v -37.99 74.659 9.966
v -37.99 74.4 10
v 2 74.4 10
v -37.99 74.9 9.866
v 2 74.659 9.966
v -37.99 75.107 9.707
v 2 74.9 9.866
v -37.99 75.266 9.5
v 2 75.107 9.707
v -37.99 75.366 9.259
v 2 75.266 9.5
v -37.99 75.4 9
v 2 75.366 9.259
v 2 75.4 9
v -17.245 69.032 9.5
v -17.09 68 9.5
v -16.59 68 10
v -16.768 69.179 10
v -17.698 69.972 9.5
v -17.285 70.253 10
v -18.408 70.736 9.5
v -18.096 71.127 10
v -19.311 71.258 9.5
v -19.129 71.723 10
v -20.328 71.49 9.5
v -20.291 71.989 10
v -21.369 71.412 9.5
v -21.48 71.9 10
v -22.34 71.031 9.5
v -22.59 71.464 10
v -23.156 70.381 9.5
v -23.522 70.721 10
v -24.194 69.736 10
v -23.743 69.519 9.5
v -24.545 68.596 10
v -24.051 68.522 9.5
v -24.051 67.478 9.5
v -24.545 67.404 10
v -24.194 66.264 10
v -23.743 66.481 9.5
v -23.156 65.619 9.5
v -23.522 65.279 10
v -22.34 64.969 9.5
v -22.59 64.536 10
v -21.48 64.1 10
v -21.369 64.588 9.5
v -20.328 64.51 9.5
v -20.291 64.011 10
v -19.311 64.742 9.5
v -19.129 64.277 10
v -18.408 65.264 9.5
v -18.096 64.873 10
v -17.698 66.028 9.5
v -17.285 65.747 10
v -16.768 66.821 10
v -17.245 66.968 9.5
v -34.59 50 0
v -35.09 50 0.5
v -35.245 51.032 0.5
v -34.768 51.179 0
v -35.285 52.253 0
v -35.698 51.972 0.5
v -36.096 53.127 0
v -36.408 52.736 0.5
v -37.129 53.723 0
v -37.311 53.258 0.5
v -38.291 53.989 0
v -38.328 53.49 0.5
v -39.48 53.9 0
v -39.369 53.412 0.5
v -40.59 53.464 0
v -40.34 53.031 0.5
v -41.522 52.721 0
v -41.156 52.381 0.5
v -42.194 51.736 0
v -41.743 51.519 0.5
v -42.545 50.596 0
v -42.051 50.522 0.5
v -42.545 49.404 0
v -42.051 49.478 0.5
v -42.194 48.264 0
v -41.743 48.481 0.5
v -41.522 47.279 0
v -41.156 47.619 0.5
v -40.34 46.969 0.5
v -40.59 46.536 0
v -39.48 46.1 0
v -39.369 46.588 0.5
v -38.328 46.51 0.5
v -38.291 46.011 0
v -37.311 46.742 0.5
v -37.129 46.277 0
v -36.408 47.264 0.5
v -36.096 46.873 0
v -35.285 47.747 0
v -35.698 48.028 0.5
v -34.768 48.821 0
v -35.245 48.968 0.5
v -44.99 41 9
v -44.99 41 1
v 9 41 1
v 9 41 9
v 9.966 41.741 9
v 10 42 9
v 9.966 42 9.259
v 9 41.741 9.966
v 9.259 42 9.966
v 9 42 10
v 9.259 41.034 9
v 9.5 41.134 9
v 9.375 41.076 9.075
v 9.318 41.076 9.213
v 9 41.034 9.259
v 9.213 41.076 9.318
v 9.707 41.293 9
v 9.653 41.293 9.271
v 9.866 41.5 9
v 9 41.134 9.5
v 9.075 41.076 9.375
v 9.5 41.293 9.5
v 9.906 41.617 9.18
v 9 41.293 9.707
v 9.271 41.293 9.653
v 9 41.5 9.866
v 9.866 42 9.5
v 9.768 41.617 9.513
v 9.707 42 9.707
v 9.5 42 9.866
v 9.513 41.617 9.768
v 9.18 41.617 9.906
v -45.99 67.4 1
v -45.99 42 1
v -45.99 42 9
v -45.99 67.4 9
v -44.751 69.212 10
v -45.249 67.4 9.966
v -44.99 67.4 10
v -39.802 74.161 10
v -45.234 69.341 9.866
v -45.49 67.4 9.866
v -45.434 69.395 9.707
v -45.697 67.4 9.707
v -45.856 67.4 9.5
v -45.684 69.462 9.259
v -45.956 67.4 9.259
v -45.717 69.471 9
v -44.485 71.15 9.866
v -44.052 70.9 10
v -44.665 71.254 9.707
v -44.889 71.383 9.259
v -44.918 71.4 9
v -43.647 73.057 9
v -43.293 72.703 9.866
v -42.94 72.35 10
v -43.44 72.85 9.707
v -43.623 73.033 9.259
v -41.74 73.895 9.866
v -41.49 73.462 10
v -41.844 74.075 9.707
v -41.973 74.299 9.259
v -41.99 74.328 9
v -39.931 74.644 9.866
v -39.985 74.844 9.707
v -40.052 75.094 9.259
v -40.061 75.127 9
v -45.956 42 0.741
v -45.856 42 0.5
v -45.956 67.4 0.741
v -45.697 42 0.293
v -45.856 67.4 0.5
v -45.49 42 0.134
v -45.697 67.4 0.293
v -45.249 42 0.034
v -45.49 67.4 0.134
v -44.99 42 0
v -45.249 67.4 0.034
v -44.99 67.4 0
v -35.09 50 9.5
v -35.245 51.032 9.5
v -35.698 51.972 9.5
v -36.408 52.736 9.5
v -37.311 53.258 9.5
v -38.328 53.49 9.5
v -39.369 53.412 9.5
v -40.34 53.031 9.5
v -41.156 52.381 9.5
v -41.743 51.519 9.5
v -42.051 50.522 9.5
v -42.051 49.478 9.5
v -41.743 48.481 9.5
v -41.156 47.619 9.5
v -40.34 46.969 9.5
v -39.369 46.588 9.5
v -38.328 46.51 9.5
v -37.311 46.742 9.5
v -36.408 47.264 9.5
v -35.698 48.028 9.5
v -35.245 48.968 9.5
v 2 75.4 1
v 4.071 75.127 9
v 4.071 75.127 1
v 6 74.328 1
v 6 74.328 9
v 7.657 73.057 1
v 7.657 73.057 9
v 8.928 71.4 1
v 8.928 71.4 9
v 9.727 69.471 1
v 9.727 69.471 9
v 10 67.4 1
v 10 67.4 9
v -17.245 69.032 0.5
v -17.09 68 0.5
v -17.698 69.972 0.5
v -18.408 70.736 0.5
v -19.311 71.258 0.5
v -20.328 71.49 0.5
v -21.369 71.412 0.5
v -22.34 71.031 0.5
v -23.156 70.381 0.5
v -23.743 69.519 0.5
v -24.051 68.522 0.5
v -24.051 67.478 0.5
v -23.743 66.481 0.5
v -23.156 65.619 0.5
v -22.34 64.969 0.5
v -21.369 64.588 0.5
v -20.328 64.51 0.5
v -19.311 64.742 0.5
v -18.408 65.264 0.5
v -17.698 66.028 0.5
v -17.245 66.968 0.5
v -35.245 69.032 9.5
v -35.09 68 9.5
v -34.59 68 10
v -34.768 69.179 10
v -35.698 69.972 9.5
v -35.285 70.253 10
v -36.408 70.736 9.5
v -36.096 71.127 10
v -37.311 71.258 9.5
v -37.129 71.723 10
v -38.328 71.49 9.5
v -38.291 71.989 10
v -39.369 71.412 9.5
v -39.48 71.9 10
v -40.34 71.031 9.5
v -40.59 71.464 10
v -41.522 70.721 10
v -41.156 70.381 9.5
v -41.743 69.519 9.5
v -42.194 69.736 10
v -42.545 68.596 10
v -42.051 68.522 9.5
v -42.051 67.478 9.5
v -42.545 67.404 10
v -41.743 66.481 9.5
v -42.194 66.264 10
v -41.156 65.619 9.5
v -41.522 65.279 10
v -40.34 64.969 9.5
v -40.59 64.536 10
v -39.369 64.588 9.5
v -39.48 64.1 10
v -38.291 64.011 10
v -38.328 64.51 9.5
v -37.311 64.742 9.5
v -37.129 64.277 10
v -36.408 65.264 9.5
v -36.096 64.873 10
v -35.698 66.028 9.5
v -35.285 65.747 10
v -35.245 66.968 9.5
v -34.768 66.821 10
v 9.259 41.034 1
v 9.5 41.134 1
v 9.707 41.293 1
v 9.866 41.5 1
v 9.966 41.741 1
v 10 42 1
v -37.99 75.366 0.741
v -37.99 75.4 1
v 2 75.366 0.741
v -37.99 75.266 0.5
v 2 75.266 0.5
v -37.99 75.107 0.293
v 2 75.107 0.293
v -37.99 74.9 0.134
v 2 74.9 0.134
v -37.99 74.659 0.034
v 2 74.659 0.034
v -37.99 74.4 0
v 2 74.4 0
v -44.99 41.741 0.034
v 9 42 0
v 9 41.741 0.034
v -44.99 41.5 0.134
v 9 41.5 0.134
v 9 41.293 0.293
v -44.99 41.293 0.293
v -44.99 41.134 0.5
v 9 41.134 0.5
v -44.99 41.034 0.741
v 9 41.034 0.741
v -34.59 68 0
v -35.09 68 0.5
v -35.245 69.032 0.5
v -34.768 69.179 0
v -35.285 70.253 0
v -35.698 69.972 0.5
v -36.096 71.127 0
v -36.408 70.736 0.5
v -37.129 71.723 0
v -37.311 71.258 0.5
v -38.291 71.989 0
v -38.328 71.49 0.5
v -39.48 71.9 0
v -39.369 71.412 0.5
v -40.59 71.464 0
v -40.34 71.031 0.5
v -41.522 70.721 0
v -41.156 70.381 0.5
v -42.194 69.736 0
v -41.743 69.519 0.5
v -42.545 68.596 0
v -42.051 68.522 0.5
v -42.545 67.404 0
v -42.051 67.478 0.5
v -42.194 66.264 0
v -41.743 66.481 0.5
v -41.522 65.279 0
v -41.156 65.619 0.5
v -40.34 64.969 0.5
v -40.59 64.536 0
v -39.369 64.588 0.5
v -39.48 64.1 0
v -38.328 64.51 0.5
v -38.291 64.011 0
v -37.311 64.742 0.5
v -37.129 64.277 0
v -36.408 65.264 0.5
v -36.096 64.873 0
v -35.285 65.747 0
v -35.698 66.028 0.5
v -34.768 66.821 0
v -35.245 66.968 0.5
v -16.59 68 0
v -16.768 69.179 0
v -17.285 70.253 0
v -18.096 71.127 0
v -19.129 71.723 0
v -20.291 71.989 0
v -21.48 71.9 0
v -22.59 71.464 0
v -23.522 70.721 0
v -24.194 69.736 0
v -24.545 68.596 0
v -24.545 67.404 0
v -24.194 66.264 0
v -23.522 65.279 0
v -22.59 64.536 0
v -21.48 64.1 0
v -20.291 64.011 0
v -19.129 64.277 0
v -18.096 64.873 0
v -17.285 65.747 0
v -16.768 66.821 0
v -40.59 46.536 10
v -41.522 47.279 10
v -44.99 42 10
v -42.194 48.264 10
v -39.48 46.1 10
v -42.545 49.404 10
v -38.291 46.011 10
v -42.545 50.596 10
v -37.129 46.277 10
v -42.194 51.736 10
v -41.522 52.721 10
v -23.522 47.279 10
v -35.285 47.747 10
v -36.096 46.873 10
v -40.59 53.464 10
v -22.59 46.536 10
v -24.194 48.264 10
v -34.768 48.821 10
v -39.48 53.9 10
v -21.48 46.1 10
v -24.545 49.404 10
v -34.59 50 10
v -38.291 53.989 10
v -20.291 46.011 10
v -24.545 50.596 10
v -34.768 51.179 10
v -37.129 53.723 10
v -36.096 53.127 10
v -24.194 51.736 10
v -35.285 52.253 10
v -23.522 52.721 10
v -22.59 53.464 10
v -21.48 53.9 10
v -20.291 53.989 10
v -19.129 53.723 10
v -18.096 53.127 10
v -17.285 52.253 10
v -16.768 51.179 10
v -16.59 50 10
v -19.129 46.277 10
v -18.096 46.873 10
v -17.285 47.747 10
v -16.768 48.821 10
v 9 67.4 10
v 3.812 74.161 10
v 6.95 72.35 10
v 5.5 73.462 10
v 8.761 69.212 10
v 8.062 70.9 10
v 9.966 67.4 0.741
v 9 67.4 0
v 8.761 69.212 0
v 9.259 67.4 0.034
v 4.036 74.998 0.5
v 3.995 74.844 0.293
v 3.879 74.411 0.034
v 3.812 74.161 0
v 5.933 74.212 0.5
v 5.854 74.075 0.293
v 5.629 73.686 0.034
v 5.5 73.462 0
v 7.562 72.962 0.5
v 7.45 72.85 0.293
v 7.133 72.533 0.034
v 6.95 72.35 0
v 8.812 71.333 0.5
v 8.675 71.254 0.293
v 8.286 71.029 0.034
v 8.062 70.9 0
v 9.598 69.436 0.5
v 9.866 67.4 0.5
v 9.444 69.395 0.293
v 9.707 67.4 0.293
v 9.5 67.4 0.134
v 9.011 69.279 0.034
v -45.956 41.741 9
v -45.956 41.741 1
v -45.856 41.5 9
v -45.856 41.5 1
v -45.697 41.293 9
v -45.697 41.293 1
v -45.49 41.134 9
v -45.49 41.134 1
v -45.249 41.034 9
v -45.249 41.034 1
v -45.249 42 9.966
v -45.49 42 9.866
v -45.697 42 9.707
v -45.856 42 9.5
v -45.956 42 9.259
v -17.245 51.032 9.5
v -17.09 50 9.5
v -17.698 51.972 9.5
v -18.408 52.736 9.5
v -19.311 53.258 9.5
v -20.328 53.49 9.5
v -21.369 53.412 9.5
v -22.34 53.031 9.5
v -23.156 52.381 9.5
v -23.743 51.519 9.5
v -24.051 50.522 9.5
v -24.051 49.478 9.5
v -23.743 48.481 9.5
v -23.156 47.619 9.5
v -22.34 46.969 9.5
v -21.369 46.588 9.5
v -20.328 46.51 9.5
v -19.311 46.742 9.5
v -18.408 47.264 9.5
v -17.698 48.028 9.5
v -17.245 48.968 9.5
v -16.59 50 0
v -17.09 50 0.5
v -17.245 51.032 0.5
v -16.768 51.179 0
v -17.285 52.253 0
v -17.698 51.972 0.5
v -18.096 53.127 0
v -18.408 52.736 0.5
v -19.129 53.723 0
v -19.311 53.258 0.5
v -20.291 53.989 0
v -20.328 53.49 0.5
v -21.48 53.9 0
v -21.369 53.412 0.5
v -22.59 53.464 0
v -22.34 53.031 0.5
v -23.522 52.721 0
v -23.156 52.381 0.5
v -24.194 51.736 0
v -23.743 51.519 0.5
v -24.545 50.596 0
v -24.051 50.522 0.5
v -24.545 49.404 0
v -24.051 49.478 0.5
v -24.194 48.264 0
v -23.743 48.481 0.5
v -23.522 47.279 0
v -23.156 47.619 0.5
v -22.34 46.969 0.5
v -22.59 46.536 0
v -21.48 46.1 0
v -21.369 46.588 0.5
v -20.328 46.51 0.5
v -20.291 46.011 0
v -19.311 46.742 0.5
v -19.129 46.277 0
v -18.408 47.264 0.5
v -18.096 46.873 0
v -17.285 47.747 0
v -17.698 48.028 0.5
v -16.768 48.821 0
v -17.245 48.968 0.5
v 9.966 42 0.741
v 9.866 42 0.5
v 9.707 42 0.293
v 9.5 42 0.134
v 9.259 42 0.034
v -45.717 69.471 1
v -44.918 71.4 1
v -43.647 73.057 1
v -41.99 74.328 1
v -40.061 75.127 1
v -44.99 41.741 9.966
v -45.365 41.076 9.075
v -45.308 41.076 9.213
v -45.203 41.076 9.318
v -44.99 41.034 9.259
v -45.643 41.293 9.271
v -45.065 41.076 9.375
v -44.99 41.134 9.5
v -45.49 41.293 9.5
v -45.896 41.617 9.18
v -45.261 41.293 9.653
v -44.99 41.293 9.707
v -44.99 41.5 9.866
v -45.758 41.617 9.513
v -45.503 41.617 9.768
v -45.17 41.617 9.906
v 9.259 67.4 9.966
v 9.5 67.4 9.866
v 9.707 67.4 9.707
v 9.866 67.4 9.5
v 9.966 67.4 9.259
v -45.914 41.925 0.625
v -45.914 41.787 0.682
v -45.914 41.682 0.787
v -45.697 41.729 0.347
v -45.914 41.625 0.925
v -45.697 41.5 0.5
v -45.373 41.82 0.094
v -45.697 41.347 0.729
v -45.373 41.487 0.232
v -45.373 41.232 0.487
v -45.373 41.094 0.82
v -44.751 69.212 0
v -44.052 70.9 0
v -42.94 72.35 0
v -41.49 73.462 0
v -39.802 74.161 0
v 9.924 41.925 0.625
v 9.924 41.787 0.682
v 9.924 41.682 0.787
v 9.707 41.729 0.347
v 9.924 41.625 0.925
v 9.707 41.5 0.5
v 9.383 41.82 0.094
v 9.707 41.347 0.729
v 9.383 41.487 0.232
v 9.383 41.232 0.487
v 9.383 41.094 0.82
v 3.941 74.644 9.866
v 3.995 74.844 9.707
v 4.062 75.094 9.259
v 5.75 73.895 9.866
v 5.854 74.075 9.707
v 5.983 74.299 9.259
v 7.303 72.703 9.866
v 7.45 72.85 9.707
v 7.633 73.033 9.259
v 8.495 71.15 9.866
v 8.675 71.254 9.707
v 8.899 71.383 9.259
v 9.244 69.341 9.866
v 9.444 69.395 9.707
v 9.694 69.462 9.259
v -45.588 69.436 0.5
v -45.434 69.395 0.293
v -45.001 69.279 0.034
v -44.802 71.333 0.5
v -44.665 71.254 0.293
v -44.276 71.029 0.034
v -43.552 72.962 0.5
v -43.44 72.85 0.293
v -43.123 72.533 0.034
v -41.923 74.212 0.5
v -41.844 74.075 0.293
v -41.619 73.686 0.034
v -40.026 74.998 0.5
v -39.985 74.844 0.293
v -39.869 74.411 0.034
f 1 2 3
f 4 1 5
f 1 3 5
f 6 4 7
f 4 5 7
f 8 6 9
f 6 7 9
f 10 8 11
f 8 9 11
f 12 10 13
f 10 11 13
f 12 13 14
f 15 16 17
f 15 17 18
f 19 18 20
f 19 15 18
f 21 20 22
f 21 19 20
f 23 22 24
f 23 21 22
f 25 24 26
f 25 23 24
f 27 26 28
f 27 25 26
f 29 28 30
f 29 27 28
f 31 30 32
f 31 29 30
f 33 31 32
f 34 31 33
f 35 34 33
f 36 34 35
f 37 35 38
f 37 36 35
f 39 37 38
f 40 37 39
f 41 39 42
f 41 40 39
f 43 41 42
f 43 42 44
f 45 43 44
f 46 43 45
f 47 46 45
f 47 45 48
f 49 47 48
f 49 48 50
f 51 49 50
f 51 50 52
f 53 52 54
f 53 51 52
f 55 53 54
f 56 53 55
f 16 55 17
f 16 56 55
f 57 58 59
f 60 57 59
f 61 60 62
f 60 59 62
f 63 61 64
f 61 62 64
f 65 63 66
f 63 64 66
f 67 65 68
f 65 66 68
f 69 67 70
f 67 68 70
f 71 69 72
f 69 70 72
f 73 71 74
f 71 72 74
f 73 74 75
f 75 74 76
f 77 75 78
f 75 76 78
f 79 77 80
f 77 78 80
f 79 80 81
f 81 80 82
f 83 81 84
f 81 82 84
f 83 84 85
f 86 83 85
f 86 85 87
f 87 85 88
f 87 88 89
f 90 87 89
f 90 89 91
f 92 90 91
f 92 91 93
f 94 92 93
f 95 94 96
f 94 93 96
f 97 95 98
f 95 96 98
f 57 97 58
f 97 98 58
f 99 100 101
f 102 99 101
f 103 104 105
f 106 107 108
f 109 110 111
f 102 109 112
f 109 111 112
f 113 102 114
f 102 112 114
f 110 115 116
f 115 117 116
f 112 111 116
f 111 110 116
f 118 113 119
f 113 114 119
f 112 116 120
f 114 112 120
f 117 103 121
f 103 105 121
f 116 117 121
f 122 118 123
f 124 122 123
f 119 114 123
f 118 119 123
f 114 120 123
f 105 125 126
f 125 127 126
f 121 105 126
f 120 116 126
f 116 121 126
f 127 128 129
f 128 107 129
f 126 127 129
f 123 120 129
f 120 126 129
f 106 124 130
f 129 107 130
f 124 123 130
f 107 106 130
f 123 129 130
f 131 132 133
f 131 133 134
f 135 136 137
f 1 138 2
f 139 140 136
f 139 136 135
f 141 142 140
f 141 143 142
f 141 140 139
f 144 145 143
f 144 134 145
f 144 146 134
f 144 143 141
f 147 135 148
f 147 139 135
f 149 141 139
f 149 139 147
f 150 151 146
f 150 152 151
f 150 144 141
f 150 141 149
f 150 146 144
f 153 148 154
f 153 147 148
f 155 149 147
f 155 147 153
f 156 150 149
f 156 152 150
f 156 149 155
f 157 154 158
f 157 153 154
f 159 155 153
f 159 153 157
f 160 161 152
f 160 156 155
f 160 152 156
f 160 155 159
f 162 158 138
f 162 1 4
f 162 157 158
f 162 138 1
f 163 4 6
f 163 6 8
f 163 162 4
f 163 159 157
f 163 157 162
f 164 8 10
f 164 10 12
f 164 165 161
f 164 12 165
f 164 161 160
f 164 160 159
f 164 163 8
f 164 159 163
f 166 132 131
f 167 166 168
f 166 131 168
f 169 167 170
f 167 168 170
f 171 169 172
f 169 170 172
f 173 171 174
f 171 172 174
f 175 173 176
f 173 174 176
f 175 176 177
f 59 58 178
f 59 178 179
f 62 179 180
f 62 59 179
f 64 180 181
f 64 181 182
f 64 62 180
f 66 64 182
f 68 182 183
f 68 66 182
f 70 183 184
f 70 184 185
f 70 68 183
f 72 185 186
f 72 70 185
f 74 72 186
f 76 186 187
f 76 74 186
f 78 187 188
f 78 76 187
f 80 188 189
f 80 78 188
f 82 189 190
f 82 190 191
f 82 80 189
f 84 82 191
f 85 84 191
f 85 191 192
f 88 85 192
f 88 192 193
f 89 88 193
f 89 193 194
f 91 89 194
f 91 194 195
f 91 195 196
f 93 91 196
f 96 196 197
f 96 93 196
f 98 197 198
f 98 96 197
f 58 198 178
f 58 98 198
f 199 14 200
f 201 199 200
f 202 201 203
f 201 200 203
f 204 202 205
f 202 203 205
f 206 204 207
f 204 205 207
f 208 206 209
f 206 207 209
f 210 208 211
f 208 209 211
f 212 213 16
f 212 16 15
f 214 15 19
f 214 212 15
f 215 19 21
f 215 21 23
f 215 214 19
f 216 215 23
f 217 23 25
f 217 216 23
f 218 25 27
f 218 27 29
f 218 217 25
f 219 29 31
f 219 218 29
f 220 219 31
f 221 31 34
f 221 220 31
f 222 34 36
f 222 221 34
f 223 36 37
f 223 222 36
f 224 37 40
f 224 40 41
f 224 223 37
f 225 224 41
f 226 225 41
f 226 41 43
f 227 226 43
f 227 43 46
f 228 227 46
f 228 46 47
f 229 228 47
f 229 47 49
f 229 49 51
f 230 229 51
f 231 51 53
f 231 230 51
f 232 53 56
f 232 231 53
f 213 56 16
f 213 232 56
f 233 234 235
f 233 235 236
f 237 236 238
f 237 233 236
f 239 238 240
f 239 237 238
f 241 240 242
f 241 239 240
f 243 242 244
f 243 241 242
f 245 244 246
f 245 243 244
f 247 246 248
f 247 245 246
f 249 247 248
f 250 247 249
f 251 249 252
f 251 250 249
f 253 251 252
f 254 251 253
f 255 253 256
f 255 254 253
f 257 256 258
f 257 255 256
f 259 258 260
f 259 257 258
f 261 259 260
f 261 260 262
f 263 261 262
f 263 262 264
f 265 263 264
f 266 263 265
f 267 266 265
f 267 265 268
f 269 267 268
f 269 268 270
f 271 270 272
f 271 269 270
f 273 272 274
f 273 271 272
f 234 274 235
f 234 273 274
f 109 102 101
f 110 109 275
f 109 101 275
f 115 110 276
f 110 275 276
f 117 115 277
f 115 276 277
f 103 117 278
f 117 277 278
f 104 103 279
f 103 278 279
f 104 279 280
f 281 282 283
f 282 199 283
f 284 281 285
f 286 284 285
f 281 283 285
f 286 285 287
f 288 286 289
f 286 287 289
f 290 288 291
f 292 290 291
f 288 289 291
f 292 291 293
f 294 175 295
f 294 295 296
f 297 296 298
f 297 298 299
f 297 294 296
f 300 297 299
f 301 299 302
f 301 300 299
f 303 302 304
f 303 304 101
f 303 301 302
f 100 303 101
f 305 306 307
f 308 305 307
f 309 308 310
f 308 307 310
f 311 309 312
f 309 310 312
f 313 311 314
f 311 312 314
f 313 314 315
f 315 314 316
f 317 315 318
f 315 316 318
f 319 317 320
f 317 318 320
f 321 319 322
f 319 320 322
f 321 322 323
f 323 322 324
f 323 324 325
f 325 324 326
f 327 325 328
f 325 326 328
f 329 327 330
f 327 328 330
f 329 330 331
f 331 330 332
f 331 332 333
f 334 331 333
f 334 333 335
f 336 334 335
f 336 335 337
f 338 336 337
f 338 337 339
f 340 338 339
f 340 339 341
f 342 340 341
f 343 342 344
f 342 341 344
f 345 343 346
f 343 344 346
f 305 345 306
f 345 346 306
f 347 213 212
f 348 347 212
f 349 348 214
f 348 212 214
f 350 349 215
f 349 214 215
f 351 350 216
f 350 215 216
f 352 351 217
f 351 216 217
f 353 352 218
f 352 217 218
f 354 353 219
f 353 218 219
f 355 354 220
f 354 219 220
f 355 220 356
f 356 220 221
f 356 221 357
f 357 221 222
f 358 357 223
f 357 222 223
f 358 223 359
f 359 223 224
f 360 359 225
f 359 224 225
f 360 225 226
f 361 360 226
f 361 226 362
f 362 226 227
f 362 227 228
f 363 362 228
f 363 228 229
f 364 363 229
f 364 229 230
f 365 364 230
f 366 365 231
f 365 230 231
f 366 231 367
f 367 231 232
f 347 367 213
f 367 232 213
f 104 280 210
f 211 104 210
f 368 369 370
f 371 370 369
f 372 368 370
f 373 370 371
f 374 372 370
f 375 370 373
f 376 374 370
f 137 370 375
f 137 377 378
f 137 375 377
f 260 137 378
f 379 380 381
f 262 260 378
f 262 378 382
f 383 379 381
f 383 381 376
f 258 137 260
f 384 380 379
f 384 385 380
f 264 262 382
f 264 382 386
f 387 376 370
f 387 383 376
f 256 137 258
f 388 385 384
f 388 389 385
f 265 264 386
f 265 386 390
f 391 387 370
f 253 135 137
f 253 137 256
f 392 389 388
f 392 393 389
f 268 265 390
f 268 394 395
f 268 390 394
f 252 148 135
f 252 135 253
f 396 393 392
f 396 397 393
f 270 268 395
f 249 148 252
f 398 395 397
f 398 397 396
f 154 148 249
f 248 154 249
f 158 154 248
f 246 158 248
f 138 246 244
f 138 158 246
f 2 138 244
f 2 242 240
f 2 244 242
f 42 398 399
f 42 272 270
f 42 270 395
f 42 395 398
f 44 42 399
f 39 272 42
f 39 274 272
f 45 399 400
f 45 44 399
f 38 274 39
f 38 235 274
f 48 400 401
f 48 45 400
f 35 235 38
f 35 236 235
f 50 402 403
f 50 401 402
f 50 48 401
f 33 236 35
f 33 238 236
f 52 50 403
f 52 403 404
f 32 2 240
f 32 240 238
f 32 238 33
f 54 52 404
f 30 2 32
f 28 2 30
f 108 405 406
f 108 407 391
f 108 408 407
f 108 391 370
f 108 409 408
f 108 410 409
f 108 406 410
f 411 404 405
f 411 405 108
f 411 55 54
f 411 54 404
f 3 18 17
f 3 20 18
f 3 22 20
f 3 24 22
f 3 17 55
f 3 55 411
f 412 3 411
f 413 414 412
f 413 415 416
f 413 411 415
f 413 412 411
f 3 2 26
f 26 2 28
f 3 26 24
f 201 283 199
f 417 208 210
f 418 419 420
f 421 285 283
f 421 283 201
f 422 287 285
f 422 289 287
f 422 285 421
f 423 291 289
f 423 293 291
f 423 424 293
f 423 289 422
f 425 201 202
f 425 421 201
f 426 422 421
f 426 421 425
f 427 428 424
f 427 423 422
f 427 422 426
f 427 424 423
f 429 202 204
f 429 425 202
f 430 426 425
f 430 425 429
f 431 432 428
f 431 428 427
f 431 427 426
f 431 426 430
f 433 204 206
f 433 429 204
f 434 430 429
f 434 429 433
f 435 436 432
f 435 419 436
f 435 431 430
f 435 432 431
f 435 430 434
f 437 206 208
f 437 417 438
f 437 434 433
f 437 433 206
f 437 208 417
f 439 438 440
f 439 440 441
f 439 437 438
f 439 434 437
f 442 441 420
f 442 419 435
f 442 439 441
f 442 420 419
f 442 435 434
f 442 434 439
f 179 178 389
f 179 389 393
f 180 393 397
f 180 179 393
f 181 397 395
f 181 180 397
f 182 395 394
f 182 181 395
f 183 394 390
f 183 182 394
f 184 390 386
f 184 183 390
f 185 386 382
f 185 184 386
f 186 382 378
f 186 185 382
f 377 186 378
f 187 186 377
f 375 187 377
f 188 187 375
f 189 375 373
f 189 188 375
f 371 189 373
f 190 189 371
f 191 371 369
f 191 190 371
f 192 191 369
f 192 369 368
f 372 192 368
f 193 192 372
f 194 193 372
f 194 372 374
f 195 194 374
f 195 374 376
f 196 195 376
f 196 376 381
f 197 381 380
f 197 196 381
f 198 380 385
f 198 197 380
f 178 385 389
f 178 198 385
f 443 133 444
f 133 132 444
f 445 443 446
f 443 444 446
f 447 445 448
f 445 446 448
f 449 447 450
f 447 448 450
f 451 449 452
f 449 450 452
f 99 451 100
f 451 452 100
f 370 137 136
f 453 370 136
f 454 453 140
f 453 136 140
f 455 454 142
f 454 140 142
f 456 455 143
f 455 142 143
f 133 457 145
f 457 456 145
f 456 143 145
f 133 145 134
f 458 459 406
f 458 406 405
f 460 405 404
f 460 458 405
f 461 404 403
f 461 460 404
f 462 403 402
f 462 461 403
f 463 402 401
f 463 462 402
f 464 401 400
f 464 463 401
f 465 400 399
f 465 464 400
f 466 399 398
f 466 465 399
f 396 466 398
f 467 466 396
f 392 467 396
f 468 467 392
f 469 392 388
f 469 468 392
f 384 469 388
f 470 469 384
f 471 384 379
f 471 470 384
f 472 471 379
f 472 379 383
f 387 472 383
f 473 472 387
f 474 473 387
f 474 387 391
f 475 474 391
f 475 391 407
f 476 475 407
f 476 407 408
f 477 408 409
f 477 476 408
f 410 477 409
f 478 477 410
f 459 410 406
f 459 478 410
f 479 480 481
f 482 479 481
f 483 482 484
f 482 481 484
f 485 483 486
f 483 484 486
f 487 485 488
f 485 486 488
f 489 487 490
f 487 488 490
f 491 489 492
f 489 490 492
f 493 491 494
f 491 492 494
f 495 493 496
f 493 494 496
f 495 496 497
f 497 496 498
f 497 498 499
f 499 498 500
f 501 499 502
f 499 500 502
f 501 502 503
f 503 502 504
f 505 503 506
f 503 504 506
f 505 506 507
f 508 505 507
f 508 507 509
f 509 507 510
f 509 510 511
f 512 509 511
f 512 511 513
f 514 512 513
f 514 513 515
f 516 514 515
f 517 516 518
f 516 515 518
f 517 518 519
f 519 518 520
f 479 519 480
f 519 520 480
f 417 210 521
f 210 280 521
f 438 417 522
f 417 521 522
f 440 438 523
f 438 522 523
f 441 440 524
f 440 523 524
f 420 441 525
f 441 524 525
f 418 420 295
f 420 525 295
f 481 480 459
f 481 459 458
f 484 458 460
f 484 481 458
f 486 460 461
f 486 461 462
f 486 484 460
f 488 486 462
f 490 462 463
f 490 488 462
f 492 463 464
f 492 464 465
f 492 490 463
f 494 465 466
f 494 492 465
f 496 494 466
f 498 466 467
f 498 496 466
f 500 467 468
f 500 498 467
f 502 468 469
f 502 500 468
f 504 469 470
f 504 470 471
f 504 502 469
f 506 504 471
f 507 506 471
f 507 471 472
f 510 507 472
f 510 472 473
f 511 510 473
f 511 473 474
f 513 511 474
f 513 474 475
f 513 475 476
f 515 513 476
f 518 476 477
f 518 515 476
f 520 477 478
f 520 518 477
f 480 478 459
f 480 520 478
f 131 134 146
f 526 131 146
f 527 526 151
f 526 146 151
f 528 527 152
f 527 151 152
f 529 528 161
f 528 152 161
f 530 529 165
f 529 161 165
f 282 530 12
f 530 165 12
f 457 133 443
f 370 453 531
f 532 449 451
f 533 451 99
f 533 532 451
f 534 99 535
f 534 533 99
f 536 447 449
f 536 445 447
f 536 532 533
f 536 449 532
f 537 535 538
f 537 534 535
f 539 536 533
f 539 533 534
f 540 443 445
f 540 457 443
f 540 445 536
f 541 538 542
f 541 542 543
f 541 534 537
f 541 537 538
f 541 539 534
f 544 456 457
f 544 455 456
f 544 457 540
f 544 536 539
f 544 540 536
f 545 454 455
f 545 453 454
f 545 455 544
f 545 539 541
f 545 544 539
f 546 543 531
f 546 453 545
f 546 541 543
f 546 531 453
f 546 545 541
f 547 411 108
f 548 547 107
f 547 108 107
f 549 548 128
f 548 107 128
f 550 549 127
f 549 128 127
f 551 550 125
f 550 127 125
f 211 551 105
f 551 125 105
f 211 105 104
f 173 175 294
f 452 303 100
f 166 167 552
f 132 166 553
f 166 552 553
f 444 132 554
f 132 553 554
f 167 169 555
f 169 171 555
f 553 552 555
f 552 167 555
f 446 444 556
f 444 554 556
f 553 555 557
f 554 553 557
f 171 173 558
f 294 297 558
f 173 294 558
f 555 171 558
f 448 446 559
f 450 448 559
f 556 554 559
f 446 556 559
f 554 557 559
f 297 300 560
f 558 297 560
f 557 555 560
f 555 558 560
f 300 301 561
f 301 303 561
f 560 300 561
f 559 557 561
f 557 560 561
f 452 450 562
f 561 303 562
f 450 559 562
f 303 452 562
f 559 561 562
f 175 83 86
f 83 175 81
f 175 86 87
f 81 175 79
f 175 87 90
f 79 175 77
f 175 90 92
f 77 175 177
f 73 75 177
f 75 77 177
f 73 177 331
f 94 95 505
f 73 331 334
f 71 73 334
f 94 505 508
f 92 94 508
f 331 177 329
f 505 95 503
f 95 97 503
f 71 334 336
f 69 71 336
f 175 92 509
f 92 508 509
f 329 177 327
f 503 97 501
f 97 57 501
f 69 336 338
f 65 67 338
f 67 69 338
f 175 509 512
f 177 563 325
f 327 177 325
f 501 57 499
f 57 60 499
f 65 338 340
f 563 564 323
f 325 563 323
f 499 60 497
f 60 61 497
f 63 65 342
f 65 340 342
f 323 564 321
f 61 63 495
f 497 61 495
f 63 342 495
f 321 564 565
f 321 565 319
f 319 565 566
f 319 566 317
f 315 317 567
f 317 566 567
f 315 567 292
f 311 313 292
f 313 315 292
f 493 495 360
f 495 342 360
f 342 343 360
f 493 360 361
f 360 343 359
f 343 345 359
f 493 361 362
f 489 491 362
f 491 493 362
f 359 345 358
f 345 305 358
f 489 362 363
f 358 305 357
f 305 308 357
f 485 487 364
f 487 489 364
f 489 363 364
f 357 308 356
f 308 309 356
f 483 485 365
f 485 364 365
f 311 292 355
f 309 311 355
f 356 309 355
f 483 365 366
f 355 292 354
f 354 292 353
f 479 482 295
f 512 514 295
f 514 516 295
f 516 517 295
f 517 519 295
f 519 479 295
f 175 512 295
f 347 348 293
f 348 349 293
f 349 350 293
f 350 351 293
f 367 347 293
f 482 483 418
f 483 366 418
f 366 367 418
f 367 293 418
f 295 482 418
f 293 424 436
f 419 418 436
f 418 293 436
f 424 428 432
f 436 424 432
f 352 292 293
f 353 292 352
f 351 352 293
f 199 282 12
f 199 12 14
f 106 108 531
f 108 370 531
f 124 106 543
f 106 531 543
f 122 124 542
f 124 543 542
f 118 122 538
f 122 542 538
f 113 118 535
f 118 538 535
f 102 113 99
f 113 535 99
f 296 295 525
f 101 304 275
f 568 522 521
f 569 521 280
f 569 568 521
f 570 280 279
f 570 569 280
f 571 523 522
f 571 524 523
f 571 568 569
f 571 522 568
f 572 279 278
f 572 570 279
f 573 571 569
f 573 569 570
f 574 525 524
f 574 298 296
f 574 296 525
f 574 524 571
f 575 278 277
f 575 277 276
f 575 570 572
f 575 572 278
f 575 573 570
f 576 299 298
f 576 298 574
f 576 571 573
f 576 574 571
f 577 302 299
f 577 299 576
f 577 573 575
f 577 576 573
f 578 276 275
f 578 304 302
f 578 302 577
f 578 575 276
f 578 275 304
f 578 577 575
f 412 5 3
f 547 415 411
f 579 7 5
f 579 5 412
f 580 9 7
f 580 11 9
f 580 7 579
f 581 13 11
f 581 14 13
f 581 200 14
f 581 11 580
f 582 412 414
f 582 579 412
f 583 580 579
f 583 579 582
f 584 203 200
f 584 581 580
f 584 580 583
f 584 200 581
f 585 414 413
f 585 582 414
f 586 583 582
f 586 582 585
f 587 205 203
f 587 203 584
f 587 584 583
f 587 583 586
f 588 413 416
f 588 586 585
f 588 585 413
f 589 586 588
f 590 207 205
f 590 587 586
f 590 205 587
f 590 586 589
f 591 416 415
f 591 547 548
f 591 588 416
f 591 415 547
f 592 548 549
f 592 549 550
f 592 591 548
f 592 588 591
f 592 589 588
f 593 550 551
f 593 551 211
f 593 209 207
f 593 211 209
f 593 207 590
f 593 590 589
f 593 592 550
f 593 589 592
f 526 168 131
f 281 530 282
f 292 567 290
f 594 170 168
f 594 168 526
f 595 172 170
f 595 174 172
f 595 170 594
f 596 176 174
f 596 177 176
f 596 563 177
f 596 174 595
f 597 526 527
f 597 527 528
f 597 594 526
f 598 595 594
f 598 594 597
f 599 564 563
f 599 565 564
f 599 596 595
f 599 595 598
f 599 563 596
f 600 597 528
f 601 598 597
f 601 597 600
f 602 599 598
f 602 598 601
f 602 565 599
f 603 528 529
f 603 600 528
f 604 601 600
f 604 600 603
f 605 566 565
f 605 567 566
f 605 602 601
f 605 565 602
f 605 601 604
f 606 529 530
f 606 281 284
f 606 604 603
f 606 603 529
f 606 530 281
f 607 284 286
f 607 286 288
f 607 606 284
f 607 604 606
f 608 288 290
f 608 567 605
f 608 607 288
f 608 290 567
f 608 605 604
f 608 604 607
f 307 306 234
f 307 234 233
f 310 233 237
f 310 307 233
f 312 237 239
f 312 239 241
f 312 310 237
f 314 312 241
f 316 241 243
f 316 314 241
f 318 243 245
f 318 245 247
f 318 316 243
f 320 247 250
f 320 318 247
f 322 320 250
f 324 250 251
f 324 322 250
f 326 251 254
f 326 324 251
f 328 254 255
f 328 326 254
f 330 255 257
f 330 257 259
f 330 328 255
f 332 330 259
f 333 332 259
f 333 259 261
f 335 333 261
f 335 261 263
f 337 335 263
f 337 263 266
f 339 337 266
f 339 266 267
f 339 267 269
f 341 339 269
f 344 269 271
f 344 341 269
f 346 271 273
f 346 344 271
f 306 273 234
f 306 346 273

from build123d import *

# Parameters (mm, degrees)
SKETCH1_W           = 55.99
SKETCH1_H           = 87.9
SKETCH1_R           = 3.5
BOSS_EXTRUDE1_DEPTH = 10
FILLET1_R           = 8
FILLET2_R           = 1
CHAMFER1_SIZE       = 0.5


# Read off the part's stored shape, not the designer's step: Split1
with BuildPart() as part:
    # Sketch1 → Boss-Extrude1 (new body)
    with BuildSketch(Plane.XY):
        with Locations((-17.995, 31.45)):
            Rectangle(SKETCH1_W, SKETCH1_H)
        Circle(SKETCH1_R, mode=Mode.SUBTRACT)
        with Locations((-6.59, 32)):
            Circle(SKETCH1_R, mode=Mode.SUBTRACT)
        with Locations((-20.59, 32)):
            Circle(SKETCH1_R, mode=Mode.SUBTRACT)
        with Locations((-14, 0)):
            Circle(SKETCH1_R, mode=Mode.SUBTRACT)
        with Locations((-20.59, 50)):
            Circle(SKETCH1_R, mode=Mode.SUBTRACT)
        with Locations((-20.59, 68)):
            Circle(SKETCH1_R, mode=Mode.SUBTRACT)
        with Locations((-38.59, 68)):
            Circle(SKETCH1_R, mode=Mode.SUBTRACT)
        with Locations((-38.59, 50)):
            Circle(SKETCH1_R, mode=Mode.SUBTRACT)
    extrude(amount=BOSS_EXTRUDE1_DEPTH)

    # Fillet1
    fillet1_edges = [part.edges().sort_by_distance(p)[0] for p in [
        (-45.99, -12.5, 5),
        (-45.99, 75.4, 5),
        (10, 75.4, 5),
        (10, -12.5, 5),
    ]]
    fillet(fillet1_edges, radius=FILLET1_R)


with BuildPart() as body_2:
    # Split1: the piece on the far side of the plane
    add(part.part)
    split(bisect_by=Plane(origin=(0, 41, 0), x_dir=(1, 0, 0), z_dir=(0, 1, 0)), keep=Keep.BOTTOM)


with BuildPart() as part_1:
    add(part.part)

    # Split1
    split(bisect_by=Plane(origin=(0, 41, 0), x_dir=(1, 0, 0), z_dir=(0, 1, 0)), keep=Keep.TOP)

    # Fillet2
    fillet2_edges = [part_1.edges().sort_by_distance(p)[0] for p in [
        (-17.995, 41, 0),
        (-45.99, 54.2, 0),
        (-17.995, 75.4, 0),
        (7.656854249, 73.056854249, 0),
        (-43.646854249, 73.056854249, 0),
        (-17.995, 75.4, 10),
        (-45.99, 54.2, 10),
        (7.656854249, 73.056854249, 10),
        (-43.646854249, 73.056854249, 10),
        (-45.99, 41, 5),
        (10, 54.2, 10),
        (10, 54.2, 0),
        (10, 41, 5),
        (-17.995, 41, 10),
    ]]
    fillet(fillet2_edges, radius=FILLET2_R)

    # Chamfer1
    chamfer1_edges = [part_1.edges().sort_by_distance(p)[0] for p in [
        (-24.09, 50, 0),
        (-24.09, 50, 10),
        (-24.09, 68, 0),
        (-24.09, 68, 10),
        (-42.09, 68, 0),
        (-42.09, 68, 10),
        (-42.09, 50, 0),
        (-42.09, 50, 10),
    ]]
    chamfer(chamfer1_edges, length=CHAMFER1_SIZE)


solid = part_1.part
